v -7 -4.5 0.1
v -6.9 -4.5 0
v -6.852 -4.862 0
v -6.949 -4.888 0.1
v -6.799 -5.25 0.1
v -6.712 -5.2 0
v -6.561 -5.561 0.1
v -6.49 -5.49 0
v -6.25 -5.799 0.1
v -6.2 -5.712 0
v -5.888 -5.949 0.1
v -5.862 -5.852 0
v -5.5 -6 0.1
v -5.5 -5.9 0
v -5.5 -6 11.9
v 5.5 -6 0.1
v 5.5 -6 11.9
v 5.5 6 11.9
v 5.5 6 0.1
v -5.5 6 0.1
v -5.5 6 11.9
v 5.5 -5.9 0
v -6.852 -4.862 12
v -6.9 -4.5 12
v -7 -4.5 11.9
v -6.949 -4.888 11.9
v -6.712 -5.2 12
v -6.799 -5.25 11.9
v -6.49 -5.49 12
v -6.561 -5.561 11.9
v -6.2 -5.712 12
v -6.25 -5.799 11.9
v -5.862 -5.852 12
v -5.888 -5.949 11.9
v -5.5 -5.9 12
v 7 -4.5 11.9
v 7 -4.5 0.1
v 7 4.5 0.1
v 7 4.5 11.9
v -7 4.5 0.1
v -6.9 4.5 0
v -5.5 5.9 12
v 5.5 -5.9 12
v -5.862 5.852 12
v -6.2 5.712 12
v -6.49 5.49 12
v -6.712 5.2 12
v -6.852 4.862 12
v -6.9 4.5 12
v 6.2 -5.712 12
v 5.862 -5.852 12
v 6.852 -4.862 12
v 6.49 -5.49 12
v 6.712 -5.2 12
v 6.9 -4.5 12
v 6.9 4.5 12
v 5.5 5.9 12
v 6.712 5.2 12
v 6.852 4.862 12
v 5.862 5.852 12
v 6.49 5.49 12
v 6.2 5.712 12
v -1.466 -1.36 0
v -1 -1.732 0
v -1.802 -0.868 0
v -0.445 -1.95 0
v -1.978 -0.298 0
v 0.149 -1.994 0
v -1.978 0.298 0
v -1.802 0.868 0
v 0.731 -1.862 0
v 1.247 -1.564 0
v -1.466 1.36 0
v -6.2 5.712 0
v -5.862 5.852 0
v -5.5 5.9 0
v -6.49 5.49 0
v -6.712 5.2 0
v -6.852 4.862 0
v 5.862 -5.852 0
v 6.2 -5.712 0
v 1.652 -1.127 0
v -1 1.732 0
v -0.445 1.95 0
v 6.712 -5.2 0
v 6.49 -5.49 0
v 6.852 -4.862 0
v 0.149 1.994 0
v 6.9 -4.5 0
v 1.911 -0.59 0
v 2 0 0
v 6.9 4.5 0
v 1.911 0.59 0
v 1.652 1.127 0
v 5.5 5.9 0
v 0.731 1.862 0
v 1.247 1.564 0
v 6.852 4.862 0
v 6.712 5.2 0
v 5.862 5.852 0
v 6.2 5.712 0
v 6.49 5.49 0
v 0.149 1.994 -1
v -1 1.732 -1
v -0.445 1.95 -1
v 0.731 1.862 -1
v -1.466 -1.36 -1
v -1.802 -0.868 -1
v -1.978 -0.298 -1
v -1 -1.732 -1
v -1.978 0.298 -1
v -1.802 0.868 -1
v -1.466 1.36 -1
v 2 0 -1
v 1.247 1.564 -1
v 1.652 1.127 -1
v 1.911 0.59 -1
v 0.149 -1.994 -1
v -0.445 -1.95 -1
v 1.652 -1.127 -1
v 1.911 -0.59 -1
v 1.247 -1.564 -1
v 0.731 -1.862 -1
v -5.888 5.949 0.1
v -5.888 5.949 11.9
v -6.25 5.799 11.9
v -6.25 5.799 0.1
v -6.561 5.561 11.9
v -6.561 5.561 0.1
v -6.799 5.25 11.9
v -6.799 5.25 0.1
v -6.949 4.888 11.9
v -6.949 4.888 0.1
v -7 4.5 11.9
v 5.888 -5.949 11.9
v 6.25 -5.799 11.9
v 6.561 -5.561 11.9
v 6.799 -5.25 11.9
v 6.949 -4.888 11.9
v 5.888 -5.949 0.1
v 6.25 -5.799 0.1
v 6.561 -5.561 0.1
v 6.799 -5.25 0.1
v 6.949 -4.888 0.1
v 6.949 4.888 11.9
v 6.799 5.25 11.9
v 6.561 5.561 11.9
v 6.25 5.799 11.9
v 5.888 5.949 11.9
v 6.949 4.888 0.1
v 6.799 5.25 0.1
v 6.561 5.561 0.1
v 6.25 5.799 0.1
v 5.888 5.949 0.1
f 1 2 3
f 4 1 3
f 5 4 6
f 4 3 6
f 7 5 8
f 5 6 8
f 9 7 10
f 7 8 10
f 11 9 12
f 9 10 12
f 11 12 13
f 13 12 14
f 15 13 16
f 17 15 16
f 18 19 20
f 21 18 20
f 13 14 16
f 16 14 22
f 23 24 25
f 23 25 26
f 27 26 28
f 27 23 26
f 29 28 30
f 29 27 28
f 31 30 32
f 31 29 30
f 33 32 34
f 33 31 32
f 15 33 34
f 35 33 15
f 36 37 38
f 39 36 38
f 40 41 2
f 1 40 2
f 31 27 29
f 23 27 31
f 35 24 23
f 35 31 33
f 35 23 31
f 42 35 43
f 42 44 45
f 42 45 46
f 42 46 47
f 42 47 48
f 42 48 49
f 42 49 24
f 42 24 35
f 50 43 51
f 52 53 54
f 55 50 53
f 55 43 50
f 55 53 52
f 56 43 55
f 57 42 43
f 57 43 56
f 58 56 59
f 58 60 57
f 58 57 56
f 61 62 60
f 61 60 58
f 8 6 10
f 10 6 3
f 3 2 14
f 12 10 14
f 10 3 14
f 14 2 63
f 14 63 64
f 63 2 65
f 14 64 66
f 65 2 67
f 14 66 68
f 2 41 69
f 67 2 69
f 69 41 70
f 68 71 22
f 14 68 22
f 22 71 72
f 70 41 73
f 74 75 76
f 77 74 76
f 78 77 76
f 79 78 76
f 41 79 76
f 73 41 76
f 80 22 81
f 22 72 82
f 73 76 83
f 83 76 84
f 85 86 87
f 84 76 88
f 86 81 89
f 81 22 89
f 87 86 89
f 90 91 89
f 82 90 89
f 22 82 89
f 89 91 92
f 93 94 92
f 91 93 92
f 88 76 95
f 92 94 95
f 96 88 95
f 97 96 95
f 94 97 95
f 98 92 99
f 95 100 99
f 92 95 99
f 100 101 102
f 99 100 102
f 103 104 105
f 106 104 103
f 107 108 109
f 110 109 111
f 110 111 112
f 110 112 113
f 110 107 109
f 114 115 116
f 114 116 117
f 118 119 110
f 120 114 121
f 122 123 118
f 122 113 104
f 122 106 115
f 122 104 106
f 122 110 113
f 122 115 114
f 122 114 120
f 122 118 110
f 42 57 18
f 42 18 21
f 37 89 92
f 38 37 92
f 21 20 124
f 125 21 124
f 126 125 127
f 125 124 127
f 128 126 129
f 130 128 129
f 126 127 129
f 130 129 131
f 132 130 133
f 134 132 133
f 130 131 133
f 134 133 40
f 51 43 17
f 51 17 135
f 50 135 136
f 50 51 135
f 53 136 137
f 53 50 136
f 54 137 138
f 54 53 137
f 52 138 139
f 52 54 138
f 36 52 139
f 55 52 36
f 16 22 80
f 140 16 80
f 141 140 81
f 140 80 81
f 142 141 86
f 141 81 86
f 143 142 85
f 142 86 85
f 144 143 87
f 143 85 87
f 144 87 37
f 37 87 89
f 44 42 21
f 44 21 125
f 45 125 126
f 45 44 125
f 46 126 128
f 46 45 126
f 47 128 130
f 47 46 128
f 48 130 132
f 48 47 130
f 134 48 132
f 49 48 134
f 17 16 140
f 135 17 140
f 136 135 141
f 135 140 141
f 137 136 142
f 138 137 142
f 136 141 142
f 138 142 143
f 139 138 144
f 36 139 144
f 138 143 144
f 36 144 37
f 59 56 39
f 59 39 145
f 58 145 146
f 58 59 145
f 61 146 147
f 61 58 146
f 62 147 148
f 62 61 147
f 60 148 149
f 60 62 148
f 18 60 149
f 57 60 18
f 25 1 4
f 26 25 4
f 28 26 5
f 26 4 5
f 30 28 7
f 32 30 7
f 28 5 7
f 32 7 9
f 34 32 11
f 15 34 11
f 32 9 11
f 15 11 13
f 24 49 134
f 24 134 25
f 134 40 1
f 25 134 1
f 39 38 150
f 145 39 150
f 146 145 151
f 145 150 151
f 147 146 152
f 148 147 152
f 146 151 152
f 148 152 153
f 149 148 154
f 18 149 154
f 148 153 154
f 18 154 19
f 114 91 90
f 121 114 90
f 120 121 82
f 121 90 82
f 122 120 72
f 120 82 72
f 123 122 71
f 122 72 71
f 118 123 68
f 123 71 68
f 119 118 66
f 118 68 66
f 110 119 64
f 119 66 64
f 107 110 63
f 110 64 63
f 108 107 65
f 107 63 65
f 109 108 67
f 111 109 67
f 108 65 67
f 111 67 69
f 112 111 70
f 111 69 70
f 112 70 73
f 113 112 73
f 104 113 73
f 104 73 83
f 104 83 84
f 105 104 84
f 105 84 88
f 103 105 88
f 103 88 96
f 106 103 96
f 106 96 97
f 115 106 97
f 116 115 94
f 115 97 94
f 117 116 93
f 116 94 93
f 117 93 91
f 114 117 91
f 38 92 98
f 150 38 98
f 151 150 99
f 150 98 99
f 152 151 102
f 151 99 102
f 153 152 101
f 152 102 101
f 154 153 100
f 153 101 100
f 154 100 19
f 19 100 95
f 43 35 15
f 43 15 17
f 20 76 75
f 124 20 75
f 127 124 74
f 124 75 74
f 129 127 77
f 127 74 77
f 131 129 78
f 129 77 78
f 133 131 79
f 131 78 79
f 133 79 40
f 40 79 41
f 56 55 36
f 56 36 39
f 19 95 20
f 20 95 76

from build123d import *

# Parameters (mm, degrees)
F1_DEPTH = 12
F2_SIZE  = 0.1
F3_R     = 2
F4_DEPTH = 1


with BuildPart() as f1:
    # F0 (on Top) → F1 (new body)
    with BuildSketch(Plane.XY):
        with BuildLine():
            Line((-5.5, -6), (5.5, -6))
            ThreePointArc((5.5, -6), (6.56066, -5.56066), (7, -4.5))
            Line((7, -4.5), (7, 4.5))
            ThreePointArc((7, 4.5), (6.56066, 5.56066), (5.5, 6))
            Line((5.5, 6), (-5.5, 6))
            ThreePointArc((-5.5, 6), (-6.56066, 5.56066), (-7, 4.5))
            Line((-7, 4.5), (-7, -4.5))
            ThreePointArc((-7, -4.5), (-6.56066, -5.56066), (-5.5, -6))
        make_face()
    extrude(amount=F1_DEPTH)

    # F2
    f2_edges = [f1.edges().sort_by_distance(p)[0] for p in [
        (0, -6, 12),
        (6.56066, -5.56066, 12),
        (7, 0, 12),
        (6.56066, 5.56066, 12),
        (0, 6, 12),
        (-6.56066, 5.56066, 12),
        (-7, 0, 12),
        (-6.56066, -5.56066, 12),
        (0, -6, 0),
        (6.56066, -5.56066, 0),
        (7, 0, 0),
        (6.56066, 5.56066, 0),
        (0, 6, 0),
        (-6.56066, 5.56066, 0),
        (-7, 0, 0),
        (-6.56066, -5.56066, 0),
    ]]
    chamfer(f2_edges, length=F2_SIZE)

    # F3 (on face) → F4 (join)
    with BuildSketch(Plane(origin=(0, 0, 0), x_dir=(1, 0, 0), z_dir=(0, 0, -1))):
        Circle(F3_R)
    extrude(amount=F4_DEPTH)


solid = f1.part
